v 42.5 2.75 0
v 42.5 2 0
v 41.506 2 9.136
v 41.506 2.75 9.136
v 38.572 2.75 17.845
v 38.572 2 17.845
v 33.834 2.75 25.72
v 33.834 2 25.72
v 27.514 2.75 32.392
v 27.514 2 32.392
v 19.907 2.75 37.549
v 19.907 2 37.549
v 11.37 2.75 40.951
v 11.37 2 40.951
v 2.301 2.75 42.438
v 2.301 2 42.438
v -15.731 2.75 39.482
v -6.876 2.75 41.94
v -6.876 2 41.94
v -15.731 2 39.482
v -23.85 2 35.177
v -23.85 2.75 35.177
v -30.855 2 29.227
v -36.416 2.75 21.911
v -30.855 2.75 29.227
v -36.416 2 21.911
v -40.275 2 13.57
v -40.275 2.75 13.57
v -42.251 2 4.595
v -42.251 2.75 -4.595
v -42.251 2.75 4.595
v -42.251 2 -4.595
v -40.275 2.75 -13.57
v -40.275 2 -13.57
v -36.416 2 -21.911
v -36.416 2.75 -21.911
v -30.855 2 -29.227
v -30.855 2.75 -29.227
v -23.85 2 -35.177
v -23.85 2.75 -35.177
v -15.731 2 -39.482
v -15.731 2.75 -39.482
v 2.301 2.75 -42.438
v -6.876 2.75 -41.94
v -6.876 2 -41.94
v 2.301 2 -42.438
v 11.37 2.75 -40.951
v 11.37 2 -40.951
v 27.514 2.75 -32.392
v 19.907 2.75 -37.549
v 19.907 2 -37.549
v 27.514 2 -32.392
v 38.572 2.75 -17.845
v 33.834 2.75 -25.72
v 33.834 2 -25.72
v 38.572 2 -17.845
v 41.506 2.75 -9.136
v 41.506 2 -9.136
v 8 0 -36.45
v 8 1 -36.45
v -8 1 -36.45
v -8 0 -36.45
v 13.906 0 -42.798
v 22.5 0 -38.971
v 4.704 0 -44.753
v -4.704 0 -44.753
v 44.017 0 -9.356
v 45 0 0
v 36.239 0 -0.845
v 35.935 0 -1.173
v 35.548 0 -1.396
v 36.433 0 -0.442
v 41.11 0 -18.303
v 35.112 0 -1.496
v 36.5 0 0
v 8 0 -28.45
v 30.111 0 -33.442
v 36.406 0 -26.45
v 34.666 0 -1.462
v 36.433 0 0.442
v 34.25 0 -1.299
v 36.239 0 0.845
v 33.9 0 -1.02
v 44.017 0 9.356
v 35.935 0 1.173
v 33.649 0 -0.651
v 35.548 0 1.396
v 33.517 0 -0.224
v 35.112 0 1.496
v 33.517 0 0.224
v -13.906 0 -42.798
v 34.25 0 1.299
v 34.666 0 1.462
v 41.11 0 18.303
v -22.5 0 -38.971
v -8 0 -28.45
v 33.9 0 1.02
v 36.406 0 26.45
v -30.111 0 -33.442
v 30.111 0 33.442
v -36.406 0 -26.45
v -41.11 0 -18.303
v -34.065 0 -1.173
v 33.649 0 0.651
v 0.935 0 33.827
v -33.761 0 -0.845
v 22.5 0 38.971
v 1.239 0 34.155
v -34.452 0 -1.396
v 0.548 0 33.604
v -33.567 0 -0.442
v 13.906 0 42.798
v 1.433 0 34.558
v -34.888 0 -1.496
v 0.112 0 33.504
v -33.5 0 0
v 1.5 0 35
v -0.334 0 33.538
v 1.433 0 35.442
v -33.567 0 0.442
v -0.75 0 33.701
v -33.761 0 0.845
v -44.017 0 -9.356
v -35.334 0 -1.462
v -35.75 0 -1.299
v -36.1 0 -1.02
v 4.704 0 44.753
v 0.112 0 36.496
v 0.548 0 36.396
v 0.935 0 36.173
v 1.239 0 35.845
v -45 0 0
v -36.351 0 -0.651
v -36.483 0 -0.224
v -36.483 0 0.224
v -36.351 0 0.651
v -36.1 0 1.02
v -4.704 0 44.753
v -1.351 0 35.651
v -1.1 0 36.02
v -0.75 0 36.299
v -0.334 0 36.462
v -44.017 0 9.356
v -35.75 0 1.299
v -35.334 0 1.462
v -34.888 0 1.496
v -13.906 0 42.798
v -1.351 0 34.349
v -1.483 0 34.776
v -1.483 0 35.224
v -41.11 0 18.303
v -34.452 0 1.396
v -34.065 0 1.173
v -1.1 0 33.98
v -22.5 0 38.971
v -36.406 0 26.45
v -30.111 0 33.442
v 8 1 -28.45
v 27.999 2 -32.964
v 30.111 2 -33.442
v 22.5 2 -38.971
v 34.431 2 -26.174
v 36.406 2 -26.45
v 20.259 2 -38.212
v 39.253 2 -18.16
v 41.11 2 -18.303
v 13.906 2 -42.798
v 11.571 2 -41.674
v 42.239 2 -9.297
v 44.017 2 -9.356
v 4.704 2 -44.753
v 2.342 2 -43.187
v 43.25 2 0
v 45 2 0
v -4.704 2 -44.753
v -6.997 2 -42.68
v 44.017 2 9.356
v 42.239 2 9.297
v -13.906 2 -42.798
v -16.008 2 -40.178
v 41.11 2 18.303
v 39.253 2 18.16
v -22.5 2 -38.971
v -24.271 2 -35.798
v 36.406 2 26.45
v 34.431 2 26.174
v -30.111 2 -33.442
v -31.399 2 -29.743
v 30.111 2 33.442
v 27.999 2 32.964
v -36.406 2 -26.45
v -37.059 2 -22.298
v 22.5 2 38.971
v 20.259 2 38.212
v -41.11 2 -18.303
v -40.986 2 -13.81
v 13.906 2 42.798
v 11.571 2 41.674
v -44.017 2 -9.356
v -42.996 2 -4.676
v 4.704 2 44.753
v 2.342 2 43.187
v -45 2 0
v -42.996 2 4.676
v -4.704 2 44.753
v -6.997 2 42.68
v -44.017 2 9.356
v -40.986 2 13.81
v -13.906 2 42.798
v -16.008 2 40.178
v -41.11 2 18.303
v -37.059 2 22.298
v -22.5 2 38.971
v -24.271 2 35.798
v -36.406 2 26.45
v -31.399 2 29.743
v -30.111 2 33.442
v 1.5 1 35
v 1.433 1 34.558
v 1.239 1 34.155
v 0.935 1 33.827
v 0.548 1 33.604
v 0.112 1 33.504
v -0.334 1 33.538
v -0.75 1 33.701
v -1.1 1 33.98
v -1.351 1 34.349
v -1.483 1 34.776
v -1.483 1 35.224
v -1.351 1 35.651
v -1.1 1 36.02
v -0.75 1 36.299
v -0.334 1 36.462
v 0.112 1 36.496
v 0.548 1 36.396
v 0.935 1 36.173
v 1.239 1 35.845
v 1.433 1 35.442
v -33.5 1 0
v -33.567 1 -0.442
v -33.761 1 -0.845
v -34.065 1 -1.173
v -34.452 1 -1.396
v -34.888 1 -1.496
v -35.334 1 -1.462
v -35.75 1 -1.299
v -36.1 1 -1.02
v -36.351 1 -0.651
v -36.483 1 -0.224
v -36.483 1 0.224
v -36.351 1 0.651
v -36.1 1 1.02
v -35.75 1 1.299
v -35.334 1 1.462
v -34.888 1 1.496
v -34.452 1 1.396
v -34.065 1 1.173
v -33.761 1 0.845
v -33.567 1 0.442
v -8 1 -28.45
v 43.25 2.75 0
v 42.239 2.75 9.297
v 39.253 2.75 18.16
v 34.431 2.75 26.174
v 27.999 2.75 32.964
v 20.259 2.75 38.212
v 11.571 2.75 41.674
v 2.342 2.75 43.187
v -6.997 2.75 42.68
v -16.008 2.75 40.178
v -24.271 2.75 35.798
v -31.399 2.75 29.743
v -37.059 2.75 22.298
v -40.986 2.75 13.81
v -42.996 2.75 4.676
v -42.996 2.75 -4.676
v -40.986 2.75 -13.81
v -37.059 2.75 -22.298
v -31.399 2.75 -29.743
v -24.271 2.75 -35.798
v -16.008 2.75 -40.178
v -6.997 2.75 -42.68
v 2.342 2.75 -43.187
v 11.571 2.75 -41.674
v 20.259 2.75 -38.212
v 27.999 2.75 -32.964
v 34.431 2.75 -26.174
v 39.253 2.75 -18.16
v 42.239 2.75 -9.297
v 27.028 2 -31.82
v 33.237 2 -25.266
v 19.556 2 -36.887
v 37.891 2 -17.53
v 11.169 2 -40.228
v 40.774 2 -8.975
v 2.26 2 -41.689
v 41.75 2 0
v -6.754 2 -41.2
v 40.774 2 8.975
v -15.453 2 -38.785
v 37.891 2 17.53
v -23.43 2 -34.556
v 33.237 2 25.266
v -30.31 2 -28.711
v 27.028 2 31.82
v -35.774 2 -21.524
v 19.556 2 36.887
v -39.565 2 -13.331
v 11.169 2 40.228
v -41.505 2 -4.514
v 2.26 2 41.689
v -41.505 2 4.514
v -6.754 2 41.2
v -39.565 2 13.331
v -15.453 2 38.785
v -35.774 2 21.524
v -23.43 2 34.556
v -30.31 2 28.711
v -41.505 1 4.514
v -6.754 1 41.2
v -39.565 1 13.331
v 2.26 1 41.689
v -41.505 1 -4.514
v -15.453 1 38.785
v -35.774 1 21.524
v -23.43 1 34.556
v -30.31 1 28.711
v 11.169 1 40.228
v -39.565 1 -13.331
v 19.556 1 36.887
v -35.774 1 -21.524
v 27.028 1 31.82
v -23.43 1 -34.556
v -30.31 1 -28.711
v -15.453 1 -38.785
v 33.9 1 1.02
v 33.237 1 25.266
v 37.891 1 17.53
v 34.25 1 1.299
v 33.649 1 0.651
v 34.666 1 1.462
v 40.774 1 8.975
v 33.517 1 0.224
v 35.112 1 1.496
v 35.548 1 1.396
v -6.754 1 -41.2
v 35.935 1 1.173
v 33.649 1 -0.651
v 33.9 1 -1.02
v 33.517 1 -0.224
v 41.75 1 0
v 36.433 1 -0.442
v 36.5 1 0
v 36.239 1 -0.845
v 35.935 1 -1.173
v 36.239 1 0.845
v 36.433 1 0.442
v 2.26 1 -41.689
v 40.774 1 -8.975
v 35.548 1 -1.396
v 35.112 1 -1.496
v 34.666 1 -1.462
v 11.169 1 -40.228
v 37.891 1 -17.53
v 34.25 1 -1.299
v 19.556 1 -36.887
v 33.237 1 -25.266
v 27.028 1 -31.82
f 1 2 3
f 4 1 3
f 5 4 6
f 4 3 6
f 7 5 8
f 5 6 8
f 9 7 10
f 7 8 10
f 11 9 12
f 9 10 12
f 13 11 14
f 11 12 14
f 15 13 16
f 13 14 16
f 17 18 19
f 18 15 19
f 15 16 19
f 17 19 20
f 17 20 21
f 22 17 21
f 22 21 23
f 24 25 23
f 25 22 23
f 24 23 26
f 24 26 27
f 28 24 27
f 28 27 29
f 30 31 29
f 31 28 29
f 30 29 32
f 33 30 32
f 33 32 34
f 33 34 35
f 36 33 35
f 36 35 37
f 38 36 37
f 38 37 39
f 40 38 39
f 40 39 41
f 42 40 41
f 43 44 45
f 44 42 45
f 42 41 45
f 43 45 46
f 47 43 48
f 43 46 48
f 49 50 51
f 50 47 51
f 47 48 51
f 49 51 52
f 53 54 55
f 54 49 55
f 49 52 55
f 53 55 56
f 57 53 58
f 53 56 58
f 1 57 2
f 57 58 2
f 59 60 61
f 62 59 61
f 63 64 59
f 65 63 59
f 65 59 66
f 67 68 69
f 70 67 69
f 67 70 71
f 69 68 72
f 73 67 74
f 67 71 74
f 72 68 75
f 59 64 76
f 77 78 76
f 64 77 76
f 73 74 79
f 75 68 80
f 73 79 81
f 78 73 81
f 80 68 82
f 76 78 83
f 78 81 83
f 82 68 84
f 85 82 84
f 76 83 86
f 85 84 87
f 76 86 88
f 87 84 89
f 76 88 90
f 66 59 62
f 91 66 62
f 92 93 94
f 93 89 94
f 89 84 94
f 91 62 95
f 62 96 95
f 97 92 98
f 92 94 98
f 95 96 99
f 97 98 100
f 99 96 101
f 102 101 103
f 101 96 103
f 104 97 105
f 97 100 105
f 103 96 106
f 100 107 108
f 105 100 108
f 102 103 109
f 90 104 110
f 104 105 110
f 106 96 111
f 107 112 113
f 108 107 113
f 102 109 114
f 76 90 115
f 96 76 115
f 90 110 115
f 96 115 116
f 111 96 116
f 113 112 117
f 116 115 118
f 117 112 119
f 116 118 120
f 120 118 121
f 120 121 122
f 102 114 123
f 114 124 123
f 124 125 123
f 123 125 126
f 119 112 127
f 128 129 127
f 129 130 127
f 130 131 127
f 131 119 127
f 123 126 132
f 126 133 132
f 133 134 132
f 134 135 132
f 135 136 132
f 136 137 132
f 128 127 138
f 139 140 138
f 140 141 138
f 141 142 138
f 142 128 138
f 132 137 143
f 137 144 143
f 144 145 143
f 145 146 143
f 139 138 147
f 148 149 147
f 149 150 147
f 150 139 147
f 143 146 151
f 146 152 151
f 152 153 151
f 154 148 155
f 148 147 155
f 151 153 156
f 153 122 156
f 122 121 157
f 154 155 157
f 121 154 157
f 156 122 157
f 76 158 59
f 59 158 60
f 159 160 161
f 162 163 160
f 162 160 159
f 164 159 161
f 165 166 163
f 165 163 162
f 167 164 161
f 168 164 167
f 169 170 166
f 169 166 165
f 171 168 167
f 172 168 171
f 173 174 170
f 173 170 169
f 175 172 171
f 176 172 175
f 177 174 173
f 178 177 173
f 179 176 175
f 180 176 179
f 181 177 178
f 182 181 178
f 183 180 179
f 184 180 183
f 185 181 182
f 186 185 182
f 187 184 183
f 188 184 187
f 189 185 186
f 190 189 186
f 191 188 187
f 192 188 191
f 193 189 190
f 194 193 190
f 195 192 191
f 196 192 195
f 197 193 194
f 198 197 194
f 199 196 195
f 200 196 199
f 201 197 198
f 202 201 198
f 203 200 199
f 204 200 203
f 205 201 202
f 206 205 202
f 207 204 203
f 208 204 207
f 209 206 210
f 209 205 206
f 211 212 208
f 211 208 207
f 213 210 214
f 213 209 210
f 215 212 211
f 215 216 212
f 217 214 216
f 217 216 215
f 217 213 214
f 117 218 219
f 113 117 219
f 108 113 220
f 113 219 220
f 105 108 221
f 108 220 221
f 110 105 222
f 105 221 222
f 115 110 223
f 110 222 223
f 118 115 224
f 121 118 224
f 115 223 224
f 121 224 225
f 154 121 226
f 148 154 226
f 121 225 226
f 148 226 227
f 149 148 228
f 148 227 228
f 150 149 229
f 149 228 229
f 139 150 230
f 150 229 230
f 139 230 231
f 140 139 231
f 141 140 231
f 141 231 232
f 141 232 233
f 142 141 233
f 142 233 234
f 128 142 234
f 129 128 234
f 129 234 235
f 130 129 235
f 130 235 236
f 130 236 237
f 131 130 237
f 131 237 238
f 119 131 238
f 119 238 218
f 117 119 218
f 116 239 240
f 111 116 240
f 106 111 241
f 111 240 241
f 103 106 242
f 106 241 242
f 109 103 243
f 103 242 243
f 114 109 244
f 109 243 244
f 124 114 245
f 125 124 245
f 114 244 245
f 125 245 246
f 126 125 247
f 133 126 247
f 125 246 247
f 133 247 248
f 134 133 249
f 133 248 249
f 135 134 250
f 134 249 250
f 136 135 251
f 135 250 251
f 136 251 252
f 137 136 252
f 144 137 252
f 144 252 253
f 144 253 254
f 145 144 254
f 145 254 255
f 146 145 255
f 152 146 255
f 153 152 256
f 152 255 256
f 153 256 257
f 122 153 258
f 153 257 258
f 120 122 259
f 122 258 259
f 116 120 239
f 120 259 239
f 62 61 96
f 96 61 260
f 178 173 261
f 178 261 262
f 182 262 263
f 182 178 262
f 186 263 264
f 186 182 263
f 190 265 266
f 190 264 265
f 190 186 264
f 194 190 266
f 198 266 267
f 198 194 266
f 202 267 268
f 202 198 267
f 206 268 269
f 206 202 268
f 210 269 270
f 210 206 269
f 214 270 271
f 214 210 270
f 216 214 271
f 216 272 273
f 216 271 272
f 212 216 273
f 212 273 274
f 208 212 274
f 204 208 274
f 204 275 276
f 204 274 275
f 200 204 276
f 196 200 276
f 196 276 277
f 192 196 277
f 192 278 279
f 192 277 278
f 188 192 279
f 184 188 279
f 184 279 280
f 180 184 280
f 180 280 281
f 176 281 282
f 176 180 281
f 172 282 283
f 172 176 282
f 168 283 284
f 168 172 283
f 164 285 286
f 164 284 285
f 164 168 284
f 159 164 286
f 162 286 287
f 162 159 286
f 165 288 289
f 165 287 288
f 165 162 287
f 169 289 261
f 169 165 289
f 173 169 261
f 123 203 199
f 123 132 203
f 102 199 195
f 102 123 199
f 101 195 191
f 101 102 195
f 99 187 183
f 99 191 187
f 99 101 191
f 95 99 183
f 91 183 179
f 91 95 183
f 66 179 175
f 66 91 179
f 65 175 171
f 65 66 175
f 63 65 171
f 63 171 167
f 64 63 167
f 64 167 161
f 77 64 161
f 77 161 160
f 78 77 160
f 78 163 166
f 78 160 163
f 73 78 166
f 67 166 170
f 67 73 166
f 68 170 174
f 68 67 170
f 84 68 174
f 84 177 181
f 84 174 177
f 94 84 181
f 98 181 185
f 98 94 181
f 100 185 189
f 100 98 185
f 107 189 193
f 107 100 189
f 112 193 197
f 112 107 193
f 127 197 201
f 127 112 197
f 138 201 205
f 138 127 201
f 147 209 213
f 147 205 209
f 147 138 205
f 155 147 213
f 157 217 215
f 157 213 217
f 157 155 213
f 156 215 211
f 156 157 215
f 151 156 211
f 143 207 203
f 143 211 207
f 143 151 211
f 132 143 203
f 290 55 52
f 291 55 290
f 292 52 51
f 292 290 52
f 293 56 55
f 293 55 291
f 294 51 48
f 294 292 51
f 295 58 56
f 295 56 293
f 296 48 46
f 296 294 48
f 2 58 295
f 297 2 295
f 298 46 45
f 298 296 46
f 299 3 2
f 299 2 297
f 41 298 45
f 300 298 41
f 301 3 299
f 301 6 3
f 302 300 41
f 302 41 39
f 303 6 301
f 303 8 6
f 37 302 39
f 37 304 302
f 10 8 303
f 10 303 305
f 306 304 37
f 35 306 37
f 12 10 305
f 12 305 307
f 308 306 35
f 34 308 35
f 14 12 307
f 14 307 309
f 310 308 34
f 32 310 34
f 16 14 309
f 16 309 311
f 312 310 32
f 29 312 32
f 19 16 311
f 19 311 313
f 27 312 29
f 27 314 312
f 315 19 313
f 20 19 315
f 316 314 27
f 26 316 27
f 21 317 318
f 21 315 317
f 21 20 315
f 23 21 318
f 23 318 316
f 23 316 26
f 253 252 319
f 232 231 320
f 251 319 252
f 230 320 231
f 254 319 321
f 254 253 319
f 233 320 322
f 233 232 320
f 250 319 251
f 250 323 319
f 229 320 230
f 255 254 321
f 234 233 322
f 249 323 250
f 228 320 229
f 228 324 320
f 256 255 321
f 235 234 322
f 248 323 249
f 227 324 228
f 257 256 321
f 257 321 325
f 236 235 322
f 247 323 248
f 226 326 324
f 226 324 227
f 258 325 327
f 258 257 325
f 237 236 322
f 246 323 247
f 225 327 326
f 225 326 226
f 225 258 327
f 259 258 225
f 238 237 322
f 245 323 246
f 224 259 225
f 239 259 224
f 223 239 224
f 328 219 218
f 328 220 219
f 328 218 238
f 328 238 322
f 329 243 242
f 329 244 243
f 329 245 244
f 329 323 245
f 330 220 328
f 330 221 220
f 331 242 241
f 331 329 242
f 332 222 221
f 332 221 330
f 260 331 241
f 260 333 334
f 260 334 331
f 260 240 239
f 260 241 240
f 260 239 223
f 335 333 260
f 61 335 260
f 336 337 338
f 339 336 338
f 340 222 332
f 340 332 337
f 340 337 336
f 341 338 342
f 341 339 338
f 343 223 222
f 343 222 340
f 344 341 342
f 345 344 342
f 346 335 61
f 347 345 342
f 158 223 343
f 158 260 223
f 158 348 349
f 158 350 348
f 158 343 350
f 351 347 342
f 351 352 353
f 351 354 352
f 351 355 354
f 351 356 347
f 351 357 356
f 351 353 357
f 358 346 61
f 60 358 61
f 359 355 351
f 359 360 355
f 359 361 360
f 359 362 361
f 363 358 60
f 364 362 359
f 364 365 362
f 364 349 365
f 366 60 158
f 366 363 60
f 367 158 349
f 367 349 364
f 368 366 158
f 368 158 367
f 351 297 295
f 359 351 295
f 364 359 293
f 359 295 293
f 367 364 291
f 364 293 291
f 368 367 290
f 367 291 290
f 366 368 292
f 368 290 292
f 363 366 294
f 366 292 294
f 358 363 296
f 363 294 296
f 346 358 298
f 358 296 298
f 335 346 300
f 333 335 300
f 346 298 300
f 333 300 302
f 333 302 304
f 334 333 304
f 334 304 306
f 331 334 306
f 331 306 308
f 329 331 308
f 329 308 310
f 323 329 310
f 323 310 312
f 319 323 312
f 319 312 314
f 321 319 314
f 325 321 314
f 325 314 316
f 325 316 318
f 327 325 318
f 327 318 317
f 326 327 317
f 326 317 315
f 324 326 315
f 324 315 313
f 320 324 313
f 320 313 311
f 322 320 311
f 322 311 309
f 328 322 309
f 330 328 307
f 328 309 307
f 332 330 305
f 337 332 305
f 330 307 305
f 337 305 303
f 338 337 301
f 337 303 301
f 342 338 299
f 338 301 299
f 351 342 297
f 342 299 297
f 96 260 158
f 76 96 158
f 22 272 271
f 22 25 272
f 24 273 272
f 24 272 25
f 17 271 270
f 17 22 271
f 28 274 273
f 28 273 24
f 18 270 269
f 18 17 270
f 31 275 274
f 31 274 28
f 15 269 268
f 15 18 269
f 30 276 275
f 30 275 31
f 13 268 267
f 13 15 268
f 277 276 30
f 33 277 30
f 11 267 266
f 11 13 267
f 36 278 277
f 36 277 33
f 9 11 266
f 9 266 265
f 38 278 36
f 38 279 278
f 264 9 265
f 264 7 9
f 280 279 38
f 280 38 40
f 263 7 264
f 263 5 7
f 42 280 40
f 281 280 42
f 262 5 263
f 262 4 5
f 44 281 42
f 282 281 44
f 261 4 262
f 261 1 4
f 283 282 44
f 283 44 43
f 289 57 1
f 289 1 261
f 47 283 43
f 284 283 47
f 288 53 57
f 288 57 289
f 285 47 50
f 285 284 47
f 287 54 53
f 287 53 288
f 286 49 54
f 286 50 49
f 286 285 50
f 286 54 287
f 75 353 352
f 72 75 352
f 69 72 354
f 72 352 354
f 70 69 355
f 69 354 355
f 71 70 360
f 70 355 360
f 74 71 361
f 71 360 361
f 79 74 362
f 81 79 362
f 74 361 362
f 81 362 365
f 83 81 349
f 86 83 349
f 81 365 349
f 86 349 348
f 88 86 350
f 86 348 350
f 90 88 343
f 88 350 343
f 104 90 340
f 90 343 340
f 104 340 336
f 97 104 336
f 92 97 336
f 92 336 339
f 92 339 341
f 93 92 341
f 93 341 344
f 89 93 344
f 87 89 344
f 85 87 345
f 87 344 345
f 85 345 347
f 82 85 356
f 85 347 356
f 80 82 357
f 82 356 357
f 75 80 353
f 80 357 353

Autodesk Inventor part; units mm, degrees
ref_plane "YZ Plane" through (0, 0, 0) normal (1, 0, 0) x (0, 1, 0)
ref_plane "XZ Plane" through (0, 0, 0) normal (0, 1, 0) x (-1, 0, 0)
ref_plane "XY Plane" through (0, 0, 0) normal (0, 0, 1) x (1, 0, 0)
sketch "Sketch1" plane through (0, 0, 0) normal (0, 1, 0) x (-1, 0, 0)
  circle A0 centre (0, 0) radius 45
  dimension "d0" = 90
extrude "Extrusion1" add sketch "Sketch1" along normal blind 2
sketch "Sketch2" plane through (0, 2, 0) normal (0, 1, 0) x (1, 0, 0)
  circle A0 centre (0, 0) radius 45 projected
  circle A1 centre (0, 0) radius 42.5
  circle A2 centre (0, 0) radius 41.75
  circle A3 centre (0, 0) radius 43.25
  dimension "d3" = 2.5
  dimension "d4" = 0.75
  dimension "d5" = 0.75
extrude "Extrusion2" cut sketch "Sketch2" against normal blind 1 contours A2
extrude "Extrusion3" add sketch "Sketch2" along normal blind 0.75 contours A3
sketch "Sketch3" plane through (0, 1, 0) normal (0, 1, 0) x (1, 0, 0)
  circle A0 centre (0, 0) radius 40 construction
  line L0 (8, 36.45) -> (-8, 36.45)
  line L1 (-8, 36.45) -> (-8, 28.45)
  line L2 (-8, 28.45) -> (8, 28.45)
  line L3 (8, 28.45) -> (8, 36.45)
  circle A1 centre (35, 0) radius 1.5
  circle A2 centre (0, -35) radius 1.5
  circle A3 centre (-35, 0) radius 1.5
  line L4 (40, 0) -> (-40, 0) construction
  line L5 (0, 0) -> (0, -40) construction
  line L6 (0, 0) -> (0, 40) construction
  point P0 (0, 36.45)
  dimension "d10" = 80
  dimension "d11" = 5
  dimension "d12" = 3
  dimension "d13" = 3
  dimension "d14" = 5
  dimension "d15" = 3
  dimension "d16" = 5
  dimension "d17" = 16
  dimension "d18" = 8
  dimension "d21" = 36.45
extrude "Extrusion5" cut sketch "Sketch3" against normal through all contours L3 L2 L1 L0
extrude "Extrusion6" cut sketch "Sketch3" against normal through all contours A1 | A2 | A3
properties part number "ROUNDTOPCOVER"
